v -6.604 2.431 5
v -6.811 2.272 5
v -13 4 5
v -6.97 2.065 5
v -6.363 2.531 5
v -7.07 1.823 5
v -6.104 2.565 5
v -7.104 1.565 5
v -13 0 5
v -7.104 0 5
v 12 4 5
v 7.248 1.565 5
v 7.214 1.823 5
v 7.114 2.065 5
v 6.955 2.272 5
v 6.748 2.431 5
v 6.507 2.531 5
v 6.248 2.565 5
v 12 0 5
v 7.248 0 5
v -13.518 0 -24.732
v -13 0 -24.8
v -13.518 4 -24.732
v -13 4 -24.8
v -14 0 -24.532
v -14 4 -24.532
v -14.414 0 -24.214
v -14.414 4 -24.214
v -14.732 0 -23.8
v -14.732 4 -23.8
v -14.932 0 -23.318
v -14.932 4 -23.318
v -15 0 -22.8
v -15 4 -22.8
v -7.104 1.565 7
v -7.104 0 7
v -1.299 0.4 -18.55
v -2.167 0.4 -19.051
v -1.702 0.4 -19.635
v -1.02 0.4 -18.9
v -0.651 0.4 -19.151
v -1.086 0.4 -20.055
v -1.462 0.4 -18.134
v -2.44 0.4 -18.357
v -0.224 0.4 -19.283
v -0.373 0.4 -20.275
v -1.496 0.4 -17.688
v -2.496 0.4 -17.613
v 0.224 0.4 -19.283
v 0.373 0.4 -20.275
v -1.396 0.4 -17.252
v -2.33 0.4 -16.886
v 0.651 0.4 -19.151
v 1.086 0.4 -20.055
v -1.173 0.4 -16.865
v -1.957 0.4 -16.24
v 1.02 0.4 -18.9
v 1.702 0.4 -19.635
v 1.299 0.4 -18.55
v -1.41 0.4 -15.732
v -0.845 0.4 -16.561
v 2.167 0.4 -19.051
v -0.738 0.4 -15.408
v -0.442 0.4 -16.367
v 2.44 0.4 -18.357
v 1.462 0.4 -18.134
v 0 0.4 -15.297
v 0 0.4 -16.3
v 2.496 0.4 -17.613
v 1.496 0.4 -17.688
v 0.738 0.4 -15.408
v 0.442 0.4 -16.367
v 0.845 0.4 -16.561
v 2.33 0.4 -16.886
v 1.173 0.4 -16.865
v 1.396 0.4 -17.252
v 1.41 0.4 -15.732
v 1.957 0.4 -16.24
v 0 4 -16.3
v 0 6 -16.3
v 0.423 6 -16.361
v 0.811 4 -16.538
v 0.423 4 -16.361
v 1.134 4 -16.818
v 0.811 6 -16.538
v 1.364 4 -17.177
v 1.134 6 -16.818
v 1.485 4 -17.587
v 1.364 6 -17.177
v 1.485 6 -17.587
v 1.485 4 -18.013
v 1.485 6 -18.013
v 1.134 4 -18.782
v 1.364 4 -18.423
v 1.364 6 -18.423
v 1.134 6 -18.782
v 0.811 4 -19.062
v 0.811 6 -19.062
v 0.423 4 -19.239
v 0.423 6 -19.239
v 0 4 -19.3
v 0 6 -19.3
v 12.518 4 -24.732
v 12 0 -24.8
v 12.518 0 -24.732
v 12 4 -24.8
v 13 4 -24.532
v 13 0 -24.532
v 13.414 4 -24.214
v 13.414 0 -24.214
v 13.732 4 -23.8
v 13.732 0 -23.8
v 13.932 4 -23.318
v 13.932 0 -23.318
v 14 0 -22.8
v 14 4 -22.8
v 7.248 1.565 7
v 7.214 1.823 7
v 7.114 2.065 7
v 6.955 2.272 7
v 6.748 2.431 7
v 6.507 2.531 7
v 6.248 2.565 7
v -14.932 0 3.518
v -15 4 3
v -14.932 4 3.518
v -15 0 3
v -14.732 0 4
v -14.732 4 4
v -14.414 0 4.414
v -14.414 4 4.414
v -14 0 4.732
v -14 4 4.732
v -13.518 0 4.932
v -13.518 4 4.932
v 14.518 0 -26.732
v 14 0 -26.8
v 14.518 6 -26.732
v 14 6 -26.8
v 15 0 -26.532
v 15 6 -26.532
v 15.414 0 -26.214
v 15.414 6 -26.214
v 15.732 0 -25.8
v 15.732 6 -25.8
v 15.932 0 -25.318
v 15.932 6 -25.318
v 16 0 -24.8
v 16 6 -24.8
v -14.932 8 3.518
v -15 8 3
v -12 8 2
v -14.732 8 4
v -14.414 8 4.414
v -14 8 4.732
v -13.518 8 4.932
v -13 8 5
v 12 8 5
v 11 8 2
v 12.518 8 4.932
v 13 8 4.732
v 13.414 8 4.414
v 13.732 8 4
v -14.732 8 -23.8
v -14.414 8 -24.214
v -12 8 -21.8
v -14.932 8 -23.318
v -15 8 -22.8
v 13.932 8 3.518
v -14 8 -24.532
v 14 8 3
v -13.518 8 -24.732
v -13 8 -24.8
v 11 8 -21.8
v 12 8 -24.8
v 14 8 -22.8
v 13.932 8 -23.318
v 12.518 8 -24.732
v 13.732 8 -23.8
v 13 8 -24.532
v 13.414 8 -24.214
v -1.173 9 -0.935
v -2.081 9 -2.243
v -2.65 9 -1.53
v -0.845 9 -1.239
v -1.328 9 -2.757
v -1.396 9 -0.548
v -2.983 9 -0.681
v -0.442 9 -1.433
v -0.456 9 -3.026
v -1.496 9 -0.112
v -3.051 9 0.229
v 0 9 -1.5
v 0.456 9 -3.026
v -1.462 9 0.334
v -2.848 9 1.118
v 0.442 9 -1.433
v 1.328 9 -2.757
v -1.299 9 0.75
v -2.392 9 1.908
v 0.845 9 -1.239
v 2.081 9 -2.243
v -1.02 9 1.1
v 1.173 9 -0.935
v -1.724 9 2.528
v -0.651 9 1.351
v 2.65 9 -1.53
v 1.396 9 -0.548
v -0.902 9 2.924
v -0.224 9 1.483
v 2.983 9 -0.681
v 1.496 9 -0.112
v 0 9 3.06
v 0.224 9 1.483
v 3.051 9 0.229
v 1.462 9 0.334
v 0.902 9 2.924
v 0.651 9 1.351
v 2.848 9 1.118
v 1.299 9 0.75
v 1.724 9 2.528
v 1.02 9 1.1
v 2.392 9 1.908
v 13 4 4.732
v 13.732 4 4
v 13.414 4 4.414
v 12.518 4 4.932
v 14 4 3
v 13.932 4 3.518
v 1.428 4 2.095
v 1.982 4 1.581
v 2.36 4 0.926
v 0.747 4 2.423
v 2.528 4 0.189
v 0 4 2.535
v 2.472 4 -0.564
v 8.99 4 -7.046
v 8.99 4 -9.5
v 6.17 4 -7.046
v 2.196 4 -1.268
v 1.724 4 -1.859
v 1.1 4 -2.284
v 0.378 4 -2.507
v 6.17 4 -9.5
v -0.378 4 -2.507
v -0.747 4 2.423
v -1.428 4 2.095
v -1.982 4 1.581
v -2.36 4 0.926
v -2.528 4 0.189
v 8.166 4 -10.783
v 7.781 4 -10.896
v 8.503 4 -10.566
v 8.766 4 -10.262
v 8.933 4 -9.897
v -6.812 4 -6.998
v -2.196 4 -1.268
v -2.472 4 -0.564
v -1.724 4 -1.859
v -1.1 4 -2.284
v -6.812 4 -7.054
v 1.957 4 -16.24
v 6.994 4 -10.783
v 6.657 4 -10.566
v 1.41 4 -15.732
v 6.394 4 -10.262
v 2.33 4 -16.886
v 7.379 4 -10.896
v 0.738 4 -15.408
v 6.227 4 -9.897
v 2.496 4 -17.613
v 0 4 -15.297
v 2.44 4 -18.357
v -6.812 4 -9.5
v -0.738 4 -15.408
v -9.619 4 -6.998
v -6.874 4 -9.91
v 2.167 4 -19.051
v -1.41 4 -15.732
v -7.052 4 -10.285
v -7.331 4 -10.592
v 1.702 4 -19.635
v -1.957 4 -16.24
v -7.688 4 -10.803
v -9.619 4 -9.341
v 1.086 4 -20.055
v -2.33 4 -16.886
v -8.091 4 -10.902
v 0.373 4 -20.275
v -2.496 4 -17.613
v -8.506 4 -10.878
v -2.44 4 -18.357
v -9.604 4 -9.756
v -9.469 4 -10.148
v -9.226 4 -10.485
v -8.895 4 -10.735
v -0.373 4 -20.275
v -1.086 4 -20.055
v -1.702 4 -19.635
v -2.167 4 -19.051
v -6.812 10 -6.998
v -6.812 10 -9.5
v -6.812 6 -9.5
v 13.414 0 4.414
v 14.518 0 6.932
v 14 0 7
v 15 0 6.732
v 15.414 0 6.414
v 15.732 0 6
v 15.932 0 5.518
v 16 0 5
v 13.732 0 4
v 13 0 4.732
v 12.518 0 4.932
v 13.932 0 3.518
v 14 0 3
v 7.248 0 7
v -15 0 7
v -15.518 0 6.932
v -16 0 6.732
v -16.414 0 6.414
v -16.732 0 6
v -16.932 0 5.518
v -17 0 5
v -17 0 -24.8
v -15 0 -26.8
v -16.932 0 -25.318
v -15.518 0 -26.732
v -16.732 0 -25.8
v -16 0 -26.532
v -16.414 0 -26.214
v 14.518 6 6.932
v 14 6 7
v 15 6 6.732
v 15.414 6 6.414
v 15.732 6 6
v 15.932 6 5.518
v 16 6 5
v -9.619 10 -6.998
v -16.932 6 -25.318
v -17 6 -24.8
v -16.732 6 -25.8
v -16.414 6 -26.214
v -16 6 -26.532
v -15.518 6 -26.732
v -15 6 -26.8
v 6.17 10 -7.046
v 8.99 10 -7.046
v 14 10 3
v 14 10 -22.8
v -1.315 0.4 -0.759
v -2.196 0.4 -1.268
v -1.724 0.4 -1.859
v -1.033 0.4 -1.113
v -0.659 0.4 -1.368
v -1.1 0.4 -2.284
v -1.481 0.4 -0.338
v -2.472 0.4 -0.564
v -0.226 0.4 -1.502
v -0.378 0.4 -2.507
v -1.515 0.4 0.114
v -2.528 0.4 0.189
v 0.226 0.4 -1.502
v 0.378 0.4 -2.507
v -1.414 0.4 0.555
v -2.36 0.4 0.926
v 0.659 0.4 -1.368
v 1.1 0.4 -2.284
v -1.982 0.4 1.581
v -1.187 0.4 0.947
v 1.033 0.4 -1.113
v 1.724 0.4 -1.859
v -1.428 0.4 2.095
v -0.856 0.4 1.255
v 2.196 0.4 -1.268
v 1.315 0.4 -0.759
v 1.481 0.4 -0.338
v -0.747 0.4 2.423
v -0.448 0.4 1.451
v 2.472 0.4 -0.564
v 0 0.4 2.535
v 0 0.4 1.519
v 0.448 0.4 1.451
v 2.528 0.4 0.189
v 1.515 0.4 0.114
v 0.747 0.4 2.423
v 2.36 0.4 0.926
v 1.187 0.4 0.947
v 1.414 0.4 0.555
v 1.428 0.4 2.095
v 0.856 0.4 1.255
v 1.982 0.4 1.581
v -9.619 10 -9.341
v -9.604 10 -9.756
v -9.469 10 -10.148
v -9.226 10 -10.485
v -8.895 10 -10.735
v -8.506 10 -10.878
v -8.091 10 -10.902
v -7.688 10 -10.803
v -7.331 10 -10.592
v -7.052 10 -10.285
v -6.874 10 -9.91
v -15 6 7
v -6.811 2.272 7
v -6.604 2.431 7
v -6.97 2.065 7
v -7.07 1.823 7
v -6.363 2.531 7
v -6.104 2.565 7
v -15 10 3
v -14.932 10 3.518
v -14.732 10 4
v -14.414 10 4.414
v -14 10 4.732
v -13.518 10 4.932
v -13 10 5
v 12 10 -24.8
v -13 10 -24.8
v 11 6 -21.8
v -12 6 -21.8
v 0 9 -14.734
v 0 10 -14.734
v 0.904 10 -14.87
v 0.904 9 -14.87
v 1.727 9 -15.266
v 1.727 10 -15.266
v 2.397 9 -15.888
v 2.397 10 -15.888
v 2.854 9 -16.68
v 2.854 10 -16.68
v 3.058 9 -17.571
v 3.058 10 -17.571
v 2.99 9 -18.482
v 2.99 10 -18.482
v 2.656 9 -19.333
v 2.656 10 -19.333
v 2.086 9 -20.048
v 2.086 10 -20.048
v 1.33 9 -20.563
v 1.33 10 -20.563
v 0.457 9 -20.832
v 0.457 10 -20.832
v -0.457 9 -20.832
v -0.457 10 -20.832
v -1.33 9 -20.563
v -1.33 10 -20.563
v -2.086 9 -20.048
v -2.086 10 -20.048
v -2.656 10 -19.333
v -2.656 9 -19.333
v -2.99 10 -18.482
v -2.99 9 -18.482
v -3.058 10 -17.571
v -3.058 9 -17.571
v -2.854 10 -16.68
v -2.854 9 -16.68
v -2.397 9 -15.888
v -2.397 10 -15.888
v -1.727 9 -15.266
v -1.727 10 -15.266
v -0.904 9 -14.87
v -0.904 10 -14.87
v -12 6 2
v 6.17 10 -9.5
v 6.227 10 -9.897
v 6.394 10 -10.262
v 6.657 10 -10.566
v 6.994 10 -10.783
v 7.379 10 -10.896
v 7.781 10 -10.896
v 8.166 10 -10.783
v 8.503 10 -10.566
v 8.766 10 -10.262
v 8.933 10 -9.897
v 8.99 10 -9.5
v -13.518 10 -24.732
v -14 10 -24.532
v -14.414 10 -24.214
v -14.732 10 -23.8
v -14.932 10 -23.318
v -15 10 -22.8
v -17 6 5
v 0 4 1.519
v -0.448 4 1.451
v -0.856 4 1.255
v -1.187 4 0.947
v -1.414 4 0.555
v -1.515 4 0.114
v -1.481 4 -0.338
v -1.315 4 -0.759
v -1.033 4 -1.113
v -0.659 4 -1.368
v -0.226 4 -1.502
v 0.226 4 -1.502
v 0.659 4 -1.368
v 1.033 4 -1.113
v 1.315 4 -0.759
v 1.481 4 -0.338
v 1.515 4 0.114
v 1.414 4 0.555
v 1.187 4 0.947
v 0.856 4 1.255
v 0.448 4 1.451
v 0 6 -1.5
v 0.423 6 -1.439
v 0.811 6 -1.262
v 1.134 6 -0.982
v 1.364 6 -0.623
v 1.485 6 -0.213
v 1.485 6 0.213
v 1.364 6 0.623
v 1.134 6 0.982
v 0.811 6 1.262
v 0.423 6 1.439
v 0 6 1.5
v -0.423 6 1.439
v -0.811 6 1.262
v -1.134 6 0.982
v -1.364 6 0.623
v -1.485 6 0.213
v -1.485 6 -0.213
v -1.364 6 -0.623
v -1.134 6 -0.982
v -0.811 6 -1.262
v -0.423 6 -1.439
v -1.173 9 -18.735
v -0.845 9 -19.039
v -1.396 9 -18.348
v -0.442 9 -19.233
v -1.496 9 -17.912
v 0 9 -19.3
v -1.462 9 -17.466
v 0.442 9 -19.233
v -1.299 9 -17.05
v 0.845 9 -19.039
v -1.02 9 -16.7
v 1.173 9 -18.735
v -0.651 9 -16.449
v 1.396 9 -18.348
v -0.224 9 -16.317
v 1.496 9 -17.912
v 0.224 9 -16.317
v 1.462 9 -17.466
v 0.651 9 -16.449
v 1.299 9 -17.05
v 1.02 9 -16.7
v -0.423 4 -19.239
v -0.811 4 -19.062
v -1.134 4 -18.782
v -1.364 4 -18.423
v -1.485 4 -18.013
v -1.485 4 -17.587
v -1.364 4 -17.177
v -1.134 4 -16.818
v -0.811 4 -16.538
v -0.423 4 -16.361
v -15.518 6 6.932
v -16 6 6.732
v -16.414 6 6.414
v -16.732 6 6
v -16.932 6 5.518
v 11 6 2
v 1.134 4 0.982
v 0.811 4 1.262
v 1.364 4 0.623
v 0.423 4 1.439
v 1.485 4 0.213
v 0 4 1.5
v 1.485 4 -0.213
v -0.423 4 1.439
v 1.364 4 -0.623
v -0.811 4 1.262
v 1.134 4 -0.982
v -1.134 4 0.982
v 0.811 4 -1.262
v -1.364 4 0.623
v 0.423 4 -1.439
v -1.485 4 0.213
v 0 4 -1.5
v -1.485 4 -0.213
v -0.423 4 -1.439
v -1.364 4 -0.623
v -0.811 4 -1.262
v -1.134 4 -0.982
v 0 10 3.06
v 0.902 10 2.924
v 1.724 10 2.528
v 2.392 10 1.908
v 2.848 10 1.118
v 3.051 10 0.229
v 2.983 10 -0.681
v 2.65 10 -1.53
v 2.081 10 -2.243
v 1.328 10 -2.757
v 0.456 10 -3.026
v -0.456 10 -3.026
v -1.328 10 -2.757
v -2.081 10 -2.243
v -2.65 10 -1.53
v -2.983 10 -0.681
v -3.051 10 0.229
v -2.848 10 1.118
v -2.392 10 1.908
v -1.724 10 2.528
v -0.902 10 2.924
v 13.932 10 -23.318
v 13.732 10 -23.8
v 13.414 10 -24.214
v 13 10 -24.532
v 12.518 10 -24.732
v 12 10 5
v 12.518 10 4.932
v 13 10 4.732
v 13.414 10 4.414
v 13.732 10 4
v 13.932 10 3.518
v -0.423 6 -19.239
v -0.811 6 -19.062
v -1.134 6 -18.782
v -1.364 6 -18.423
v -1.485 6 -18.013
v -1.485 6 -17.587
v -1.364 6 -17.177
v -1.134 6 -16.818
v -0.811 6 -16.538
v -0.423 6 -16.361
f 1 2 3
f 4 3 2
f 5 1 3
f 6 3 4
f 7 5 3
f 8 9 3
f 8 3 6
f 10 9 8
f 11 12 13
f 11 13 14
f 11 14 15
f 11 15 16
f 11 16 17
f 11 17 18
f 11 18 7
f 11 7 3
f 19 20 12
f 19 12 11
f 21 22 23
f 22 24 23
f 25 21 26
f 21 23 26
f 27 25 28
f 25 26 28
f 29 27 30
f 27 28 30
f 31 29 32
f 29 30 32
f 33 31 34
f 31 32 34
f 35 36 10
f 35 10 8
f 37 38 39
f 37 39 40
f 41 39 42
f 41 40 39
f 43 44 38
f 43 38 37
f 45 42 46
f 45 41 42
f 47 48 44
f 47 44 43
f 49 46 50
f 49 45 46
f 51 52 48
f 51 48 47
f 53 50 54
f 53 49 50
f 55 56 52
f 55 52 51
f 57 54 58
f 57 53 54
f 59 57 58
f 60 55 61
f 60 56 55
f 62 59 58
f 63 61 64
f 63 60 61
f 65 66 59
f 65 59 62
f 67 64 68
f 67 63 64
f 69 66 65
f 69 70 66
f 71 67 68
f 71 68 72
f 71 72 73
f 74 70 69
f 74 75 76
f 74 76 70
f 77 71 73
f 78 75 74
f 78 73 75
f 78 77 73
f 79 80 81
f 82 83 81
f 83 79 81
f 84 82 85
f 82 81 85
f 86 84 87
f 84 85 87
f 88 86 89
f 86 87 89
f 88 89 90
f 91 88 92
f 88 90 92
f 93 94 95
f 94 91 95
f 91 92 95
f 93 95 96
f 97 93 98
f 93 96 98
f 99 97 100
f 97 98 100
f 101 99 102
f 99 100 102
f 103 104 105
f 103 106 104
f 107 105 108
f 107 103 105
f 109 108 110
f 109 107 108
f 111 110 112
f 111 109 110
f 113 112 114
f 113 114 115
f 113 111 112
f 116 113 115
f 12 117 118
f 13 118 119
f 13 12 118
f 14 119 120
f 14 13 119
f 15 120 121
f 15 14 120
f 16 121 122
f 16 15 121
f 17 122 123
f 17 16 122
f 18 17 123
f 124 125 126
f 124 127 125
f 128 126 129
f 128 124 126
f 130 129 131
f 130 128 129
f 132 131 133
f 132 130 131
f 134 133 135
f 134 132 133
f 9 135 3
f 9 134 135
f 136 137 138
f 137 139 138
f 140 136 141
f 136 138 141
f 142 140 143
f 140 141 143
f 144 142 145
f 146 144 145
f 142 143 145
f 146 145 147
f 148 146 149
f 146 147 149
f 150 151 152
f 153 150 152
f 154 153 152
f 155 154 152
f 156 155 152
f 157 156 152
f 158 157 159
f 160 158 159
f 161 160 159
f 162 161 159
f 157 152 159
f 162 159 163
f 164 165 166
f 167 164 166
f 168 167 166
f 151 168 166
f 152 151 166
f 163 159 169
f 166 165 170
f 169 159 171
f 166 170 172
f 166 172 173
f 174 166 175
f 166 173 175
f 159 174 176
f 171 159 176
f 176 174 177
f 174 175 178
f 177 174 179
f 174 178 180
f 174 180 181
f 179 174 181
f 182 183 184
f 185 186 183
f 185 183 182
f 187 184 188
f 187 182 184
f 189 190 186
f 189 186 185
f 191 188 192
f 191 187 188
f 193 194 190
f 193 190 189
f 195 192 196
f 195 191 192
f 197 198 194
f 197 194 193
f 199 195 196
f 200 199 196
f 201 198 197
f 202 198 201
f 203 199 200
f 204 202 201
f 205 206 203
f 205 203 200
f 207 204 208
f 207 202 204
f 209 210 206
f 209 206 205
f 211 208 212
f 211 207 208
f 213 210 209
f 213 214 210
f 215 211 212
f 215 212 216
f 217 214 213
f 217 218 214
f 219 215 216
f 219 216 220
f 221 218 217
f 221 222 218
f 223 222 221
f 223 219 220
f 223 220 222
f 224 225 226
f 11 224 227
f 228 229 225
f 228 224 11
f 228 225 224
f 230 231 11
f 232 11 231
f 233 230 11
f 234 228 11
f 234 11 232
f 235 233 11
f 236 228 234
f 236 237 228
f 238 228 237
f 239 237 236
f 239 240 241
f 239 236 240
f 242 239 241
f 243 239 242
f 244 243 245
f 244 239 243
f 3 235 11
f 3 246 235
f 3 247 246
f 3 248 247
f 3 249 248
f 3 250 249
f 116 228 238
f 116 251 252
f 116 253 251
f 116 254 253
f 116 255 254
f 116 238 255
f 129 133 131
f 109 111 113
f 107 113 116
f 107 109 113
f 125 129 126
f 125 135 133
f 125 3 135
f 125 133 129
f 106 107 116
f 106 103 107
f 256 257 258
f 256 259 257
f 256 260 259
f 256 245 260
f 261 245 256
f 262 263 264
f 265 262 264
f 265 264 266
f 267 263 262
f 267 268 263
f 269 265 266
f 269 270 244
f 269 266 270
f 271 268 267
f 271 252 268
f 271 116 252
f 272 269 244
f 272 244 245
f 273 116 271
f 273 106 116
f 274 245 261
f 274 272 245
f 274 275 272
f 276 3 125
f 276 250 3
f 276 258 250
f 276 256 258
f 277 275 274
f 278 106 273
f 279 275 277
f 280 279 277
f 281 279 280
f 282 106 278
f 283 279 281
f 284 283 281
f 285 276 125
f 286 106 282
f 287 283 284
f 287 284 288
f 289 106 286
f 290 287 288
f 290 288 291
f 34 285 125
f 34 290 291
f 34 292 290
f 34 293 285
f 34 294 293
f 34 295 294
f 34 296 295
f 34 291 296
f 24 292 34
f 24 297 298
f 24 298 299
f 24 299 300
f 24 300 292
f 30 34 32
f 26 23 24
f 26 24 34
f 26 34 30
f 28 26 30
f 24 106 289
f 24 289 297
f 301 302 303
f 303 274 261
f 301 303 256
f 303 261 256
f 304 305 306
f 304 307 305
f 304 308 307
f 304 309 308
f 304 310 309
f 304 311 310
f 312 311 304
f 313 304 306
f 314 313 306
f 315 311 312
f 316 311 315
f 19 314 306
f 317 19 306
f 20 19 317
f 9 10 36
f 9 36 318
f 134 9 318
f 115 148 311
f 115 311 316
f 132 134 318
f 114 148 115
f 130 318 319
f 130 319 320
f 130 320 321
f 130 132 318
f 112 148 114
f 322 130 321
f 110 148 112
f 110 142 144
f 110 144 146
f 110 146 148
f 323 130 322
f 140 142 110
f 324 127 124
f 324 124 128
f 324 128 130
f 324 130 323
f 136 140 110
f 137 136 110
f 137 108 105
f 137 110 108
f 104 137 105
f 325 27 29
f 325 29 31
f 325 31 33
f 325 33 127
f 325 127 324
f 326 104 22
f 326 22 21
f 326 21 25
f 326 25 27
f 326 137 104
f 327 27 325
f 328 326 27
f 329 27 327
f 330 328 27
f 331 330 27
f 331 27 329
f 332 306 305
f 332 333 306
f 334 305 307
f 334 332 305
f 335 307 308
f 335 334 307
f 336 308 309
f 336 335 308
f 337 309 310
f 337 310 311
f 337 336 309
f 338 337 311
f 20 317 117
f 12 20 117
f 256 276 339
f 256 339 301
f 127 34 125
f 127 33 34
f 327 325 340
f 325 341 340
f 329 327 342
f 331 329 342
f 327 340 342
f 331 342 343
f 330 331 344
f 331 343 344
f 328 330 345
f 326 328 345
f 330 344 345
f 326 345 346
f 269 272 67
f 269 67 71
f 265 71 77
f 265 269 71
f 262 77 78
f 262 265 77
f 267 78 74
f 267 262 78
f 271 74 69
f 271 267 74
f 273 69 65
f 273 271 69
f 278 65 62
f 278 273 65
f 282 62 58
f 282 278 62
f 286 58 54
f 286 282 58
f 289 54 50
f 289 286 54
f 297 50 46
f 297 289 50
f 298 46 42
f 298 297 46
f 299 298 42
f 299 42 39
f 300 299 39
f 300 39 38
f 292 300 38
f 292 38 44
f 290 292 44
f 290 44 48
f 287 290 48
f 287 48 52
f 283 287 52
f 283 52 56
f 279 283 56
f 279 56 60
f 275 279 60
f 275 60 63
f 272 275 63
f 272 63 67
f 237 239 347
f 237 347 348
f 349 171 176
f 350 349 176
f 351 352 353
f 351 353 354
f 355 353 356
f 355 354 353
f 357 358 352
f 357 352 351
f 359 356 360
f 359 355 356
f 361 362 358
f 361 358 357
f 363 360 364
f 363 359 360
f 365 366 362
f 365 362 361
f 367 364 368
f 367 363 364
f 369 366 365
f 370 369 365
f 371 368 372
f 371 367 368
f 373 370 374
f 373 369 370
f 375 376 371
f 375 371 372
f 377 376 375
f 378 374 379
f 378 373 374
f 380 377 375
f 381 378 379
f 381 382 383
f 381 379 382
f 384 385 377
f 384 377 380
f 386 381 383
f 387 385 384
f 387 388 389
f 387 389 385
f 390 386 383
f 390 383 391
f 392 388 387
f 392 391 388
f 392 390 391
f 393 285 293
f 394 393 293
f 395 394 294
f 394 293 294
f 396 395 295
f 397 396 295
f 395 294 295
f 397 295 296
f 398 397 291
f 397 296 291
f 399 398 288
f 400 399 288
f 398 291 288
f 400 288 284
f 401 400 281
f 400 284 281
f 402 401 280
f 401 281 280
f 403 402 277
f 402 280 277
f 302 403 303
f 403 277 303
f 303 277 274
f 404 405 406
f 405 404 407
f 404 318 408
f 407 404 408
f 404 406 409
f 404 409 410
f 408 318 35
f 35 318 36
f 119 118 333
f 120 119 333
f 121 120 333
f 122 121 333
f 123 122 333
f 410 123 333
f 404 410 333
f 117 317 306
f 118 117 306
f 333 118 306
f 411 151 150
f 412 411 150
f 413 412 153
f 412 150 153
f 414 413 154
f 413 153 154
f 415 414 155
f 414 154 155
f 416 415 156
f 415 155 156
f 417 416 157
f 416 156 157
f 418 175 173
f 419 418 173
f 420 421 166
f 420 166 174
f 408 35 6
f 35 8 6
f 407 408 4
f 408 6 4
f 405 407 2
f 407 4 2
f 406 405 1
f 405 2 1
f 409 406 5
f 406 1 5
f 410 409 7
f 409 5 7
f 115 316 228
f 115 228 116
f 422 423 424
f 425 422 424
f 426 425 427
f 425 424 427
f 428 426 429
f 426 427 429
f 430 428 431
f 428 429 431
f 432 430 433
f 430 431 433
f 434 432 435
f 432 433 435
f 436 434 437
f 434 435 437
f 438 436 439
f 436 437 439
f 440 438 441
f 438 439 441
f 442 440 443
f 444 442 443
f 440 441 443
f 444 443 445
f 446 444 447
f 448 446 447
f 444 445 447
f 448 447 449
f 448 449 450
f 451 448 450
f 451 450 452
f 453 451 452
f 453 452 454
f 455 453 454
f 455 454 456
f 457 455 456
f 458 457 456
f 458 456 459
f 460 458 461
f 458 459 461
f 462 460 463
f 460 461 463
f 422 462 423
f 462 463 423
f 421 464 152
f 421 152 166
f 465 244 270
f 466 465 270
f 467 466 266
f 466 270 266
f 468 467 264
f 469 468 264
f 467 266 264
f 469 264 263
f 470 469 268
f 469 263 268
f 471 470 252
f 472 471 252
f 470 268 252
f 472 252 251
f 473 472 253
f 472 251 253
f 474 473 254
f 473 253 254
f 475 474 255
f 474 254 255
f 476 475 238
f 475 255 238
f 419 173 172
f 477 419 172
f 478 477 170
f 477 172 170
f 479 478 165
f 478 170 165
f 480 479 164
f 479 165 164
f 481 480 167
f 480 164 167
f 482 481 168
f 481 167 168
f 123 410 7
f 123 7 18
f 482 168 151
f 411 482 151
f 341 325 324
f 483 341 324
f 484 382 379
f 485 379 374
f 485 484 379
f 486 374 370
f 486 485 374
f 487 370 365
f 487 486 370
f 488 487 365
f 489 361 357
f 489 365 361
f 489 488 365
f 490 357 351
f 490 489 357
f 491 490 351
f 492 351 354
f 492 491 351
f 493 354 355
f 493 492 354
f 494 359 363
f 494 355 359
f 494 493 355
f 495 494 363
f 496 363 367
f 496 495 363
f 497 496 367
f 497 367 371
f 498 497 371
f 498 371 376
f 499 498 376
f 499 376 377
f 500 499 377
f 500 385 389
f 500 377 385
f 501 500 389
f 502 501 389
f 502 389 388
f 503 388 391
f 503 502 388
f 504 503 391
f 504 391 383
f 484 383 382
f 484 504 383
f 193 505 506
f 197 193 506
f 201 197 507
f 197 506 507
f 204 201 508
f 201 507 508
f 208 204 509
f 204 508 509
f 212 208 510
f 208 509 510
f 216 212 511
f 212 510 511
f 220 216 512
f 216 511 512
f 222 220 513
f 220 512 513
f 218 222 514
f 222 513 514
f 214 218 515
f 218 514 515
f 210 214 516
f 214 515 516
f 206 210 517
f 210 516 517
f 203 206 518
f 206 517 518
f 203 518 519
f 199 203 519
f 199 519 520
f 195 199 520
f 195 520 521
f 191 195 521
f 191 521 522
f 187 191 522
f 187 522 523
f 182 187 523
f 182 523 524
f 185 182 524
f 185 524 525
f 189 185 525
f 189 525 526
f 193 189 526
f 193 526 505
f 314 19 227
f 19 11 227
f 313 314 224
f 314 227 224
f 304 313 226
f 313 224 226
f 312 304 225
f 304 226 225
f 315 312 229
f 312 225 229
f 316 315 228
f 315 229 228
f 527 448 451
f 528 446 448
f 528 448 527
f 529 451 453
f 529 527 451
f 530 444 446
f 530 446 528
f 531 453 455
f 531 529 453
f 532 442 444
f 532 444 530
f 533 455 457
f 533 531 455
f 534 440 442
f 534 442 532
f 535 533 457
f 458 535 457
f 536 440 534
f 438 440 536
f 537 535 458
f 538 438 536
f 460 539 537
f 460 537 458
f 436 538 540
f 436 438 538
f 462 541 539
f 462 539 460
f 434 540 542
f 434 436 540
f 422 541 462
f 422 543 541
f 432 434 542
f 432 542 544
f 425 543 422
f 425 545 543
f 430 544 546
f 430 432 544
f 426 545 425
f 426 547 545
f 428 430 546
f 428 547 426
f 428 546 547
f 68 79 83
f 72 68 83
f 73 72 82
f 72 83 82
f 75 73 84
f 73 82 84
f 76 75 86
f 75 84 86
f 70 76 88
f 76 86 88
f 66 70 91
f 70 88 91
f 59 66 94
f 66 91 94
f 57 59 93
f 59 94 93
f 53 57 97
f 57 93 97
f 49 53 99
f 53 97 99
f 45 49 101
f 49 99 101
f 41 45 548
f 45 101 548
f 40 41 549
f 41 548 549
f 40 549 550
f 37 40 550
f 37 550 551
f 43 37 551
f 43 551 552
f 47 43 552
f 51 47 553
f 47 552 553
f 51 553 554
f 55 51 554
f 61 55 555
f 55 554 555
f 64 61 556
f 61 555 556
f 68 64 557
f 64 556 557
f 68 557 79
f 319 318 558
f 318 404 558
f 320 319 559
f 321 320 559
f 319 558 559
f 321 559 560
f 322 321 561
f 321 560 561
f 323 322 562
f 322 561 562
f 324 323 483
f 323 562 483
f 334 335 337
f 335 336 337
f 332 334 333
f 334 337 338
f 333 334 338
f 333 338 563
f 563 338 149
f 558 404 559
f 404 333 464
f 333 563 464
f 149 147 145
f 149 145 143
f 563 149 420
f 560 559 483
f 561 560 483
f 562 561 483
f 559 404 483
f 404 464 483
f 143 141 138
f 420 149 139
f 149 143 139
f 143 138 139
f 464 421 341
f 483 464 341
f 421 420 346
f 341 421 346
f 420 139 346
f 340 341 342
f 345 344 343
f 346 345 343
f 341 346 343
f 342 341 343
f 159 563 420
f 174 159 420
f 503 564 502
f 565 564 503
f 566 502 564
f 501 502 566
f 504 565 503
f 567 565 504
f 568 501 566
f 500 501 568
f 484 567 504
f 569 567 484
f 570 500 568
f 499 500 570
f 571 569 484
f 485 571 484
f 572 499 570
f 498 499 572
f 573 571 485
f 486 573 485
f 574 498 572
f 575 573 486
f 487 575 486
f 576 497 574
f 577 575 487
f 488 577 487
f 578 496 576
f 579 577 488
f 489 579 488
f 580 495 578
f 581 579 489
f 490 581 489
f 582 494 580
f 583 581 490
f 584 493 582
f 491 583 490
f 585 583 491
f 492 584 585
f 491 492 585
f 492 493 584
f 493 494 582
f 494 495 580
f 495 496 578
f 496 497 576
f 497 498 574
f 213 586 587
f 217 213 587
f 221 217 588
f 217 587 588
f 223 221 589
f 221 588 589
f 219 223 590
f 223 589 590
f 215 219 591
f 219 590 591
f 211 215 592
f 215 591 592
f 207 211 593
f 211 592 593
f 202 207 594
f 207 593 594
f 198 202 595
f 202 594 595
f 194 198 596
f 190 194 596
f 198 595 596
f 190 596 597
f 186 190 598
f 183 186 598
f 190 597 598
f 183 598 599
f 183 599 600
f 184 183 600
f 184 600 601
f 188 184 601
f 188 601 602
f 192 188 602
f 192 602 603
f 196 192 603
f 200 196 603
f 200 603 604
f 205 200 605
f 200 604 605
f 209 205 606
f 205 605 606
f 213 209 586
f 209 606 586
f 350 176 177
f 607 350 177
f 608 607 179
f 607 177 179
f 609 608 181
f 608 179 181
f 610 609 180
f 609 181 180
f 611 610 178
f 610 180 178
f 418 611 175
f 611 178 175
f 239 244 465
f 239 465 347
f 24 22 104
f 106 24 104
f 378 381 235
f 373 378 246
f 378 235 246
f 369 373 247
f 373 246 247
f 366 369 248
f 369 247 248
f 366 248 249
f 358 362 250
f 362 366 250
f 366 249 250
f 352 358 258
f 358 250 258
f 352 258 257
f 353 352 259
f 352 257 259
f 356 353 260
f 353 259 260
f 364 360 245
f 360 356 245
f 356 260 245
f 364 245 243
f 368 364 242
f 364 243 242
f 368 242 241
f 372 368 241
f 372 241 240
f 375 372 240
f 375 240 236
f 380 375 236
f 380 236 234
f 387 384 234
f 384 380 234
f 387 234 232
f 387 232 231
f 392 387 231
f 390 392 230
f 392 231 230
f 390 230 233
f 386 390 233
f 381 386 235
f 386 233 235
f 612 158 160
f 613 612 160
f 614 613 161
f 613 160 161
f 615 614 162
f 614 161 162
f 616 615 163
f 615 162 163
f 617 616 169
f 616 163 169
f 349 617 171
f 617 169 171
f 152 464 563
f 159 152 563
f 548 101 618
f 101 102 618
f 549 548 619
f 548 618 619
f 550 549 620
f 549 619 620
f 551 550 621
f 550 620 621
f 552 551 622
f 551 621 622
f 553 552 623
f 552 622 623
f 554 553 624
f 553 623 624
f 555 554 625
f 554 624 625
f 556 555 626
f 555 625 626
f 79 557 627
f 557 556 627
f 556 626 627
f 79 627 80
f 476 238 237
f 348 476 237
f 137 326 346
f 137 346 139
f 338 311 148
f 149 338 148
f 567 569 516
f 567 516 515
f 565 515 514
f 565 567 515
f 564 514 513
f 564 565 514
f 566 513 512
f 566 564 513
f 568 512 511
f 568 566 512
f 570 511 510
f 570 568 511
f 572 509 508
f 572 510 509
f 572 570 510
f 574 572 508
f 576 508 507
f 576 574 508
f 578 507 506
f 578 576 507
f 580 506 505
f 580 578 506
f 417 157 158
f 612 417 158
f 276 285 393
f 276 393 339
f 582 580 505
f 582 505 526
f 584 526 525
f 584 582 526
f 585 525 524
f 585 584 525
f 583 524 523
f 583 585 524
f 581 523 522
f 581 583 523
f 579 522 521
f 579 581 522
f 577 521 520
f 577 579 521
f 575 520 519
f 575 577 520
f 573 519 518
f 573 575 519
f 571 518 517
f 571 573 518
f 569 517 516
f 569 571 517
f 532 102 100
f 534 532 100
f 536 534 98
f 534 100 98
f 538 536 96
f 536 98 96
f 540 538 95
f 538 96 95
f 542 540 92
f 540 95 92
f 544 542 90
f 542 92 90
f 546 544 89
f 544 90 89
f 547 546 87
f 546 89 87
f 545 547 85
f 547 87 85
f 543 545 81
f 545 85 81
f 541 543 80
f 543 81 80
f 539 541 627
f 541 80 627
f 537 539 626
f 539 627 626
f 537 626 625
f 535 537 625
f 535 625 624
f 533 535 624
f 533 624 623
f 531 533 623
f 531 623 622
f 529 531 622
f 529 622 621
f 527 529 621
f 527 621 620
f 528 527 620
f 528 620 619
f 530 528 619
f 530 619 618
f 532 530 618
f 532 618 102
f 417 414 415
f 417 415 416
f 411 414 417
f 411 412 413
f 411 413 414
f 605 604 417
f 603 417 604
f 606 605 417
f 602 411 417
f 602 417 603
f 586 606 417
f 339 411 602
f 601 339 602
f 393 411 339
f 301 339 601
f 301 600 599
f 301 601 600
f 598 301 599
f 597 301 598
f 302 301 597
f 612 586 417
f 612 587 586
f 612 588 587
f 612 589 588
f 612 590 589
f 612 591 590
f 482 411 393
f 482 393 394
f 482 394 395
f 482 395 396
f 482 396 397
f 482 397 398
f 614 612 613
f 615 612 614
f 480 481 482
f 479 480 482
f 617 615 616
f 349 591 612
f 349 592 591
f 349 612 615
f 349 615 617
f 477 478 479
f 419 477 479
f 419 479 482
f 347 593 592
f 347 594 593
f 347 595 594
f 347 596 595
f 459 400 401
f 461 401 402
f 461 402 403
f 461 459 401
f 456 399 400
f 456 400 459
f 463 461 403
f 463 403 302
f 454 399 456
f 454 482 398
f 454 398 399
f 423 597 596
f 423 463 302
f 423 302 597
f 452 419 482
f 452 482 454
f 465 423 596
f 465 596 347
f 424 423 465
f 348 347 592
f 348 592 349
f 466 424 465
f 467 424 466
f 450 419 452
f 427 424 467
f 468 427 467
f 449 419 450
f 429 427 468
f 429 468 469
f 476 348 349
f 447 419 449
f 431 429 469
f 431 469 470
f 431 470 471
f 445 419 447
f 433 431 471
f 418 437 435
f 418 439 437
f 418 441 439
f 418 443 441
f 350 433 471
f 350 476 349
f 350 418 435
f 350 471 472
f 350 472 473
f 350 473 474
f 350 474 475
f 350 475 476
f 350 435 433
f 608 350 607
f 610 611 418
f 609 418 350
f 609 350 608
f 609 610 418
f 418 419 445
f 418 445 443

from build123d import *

# Parameters (mm, degrees)
BOSS_EXTRUDE3_DEPTH     = 6
SHELL2_T                = -2
CUT_EXTRUDE4_DEPTH      = 32
CUT_EXTRUDE4_DEPTH_BACK = 34.275216002
SKETCH2_R               = 1.5
SKETCH2_R_2             = 1.407616296
SKETCH2_R_3             = 1.41
SKETCH2_W               = 1.407616296
SKETCH2_H               = 2.445621179
SKETCH2_W_2             = 1.376750608
SKETCH7_R               = 2.502744699
SKETCH7_R_2             = 1.5
BOSS_EXTRUDE4_DEPTH     = 6
SKETCH8_R               = 2.53531283
SKETCH8_R_2             = 1.518842354
BOSS_EXTRUDE6_DEPTH     = 4
FILLET1_R               = 2
FILLET2_R               = 2
CUT_EXTRUDE6_REACH      = 40.307
SKETCH10_W              = 14.351477832
SKETCH10_H              = 5
FILLET3_R               = 1
SKETCH11_R              = 3.20834654
SKETCH11_R_2            = 3.35149953
CUT_EXTRUDE7_DEPTH      = 0.4
SKETCH14_W              = 23
SKETCH14_H              = 23.8
BOSS_EXTRUDE9_DEPTH     = 2
BOSS_EXTRUDE10_DEPTH    = 2
SKETCH16_R              = 1.5
SKETCH16_R_2            = 1.407616296
SKETCH16_R_3            = 1.41
SKETCH16_W              = 2.806264375
SKETCH16_H              = 2.502132393
SKETCH16_W_2            = 2.82
SKETCH16_H_2            = 2.45355852
CUT_EXTRUDE9_DEPTH      = 33.299225997
SKETCH17_R              = 3.066424979
SKETCH17_R_2            = 3.059739342
CUT_EXTRUDE10_DEPTH     = 1


with BuildPart() as part:
    # Sketch1 → Boss-Extrude3 (new body)
    with BuildSketch(Plane(origin=(0, 0, 0), x_dir=(1, 0, 0), z_dir=(0, 1, 0))):
        Polygon((0, -7), (-17, -7), (-17, 17.8), (-17, 26.8), (16, 26.8), (16, 17.8), (16, -7), align=None)
    extrude(amount=BOSS_EXTRUDE3_DEPTH)

    # Shell2
    shell2_openings = [part.faces().sort_by_distance(p)[0] for p in [
        (-0.5, 0, -9.9),
    ]]
    offset(amount=SHELL2_T, openings=shell2_openings, kind=Kind.INTERSECTION)

    # Sketch2 → Cut-Extrude4 (cut, two sides: drawn at the far end of the back side and taken through both)
    with BuildSketch(Plane(origin=(0, 10, 0), x_dir=(1, 0, 0), z_dir=(0, 1, 0)).offset(-CUT_EXTRUDE4_DEPTH_BACK)):
        with Locations(Location((0, 17.8, 0), (0, 0, 270))):
            Circle(SKETCH2_R)
        with Locations((-8.22, 9.5)):
            Circle(SKETCH2_R_2)
        with Locations((7.58, 9.5)):
            Circle(SKETCH2_R_3)
        with Locations(Location((0, 0, 0), (0, 0, 270))):
            Circle(SKETCH2_R)
        with Locations((-7.516191852, 8.277189411)):
            Rectangle(SKETCH2_W, SKETCH2_H)
        with Locations((6.891624696, 8.277189411)):
            Rectangle(SKETCH2_W_2, SKETCH2_H)
    extrude(amount=CUT_EXTRUDE4_DEPTH + CUT_EXTRUDE4_DEPTH_BACK, mode=Mode.SUBTRACT)

    # Sketch7 → Boss-Extrude4 (add)
    with BuildSketch(Plane(origin=(0, 6, 0), x_dir=(1, 0, 0), z_dir=(0, 1, 0))):
        with Locations(Location((0, 17.8, 0), (0, 0, 270))):
            Circle(SKETCH7_R)
        with Locations(Location((0, 17.8, 0), (0, 0, 270))):
            Circle(SKETCH7_R_2, mode=Mode.SUBTRACT)
    extrude(amount=-BOSS_EXTRUDE4_DEPTH)

    # Sketch8 → Boss-Extrude6 (add)
    with BuildSketch(Plane.XZ.offset(-4)):
        with Locations(Location((0, 0, 0), (0, 0, 90))):
            Circle(SKETCH8_R)
        with Locations(Location((0, 0, 0), (0, 0, 90))):
            Circle(SKETCH8_R_2, mode=Mode.SUBTRACT)
    extrude(amount=BOSS_EXTRUDE6_DEPTH)

    # Fillet1
    fillet1_edges = [part.edges().sort_by_distance(p)[0] for p in [
        (-17, 3, 7),
        (-17, 3, -26.8),
        (16, 3, -26.8),
        (16, 3, 7),
    ]]
    fillet(fillet1_edges, radius=FILLET1_R)

    # Fillet2
    fillet2_edges = [part.edges().sort_by_distance(p)[0] for p in [
        (14, 2, 5),
        (14, 2, -24.8),
        (-15, 2, -24.8),
        (-15, 2, 5),
    ]]
    fillet(fillet2_edges, radius=FILLET2_R)

    # Sketch10 → Cut-Extrude6 (cut, up to next)
    with BuildSketch(Plane.XY.offset(7), mode=Mode.PRIVATE) as cut_extrude6_sk1:
        with Locations((0.071944839, 0.064631552)):
            Rectangle(SKETCH10_W, SKETCH10_H)
    cut_extrude6_tool1 = extrude(cut_extrude6_sk1.sketch, amount=-CUT_EXTRUDE6_REACH, mode=Mode.PRIVATE) & part.part
    add(cut_extrude6_tool1.solids().sort_by_distance((0.071945, 0.064632, 7))[0], mode=Mode.SUBTRACT)

    # Fillet3
    fillet3_edges = [part.edges().sort_by_distance(p)[0] for p in [
        (7.247683755, 2.564631552, 6),
        (-7.103794077, 2.564631552, 6),
    ]]
    fillet(fillet3_edges, radius=FILLET3_R)

    # Sketch11 → Cut-Extrude7 (cut)
    with BuildSketch(Plane.XZ):
        Circle(SKETCH11_R)
        with Locations((0, -17.8)):
            Circle(SKETCH11_R_2)
    extrude(amount=-CUT_EXTRUDE7_DEPTH, mode=Mode.SUBTRACT)

    # Sketch14 → Boss-Extrude9 (add)
    with BuildSketch(Plane(origin=(0, 6, 0), x_dir=(1, 0, 0), z_dir=(0, 1, 0))):
        with Locations((-0.5, 9.9)):
            Rectangle(SKETCH14_W, SKETCH14_H)
    extrude(amount=BOSS_EXTRUDE9_DEPTH)

    # Sketch15 → Boss-Extrude10 (add)
    with BuildSketch(Plane(origin=(0, 8, 0), x_dir=(1, 0, 0), z_dir=(0, 1, 0))):
        with BuildLine():
            Line((14, -3), (14, 22.8))
            ThreePointArc((14, 22.8), (13.414213562, 24.214213562), (12, 24.8))
            Line((12, 24.8), (-13, 24.8))
            ThreePointArc((-13, 24.8), (-14.414213562, 24.214213562), (-15, 22.8))
            Line((-15, 22.8), (-15, -3))
            ThreePointArc((-15, -3), (-14.414213562, -4.414213562), (-13, -5))
            Line((-13, -5), (12, -5))
            ThreePointArc((12, -5), (13.414213562, -4.414213562), (14, -3))
        make_face()
    extrude(amount=BOSS_EXTRUDE10_DEPTH)

    # Sketch16 → Cut-Extrude9 (cut, through all)
    with BuildSketch(Plane.XZ.offset(-4)):
        with Locations(Location((0, 0, 0), (0, 0, 270))):
            Circle(SKETCH16_R)
        with Locations(Location((0, -17.8, 0), (0, 0, 270))):
            Circle(SKETCH16_R)
        with Locations((-8.22, -9.5)):
            Circle(SKETCH16_R_2)
        with Locations((7.58, -9.5)):
            Circle(SKETCH16_R_3)
        with Locations((-8.215515892, -8.248933803)):
            Rectangle(SKETCH16_W, SKETCH16_H)
        with Locations((7.58, -8.27322074)):
            Rectangle(SKETCH16_W_2, SKETCH16_H_2)
    extrude(amount=-CUT_EXTRUDE9_DEPTH, mode=Mode.SUBTRACT)

    # Sketch17 → Cut-Extrude10 (cut)
    with BuildSketch(Plane(origin=(0, 10, 0), x_dir=(1, 0, 0), z_dir=(0, 1, 0))):
        with Locations(Location((0, 17.8, 0), (0, 0, 270))):
            Circle(SKETCH17_R)
        with Locations(Location((0, 0, 0), (0, 0, 270))):
            Circle(SKETCH17_R_2)
    extrude(amount=-CUT_EXTRUDE10_DEPTH, mode=Mode.SUBTRACT)


solid = part.part
